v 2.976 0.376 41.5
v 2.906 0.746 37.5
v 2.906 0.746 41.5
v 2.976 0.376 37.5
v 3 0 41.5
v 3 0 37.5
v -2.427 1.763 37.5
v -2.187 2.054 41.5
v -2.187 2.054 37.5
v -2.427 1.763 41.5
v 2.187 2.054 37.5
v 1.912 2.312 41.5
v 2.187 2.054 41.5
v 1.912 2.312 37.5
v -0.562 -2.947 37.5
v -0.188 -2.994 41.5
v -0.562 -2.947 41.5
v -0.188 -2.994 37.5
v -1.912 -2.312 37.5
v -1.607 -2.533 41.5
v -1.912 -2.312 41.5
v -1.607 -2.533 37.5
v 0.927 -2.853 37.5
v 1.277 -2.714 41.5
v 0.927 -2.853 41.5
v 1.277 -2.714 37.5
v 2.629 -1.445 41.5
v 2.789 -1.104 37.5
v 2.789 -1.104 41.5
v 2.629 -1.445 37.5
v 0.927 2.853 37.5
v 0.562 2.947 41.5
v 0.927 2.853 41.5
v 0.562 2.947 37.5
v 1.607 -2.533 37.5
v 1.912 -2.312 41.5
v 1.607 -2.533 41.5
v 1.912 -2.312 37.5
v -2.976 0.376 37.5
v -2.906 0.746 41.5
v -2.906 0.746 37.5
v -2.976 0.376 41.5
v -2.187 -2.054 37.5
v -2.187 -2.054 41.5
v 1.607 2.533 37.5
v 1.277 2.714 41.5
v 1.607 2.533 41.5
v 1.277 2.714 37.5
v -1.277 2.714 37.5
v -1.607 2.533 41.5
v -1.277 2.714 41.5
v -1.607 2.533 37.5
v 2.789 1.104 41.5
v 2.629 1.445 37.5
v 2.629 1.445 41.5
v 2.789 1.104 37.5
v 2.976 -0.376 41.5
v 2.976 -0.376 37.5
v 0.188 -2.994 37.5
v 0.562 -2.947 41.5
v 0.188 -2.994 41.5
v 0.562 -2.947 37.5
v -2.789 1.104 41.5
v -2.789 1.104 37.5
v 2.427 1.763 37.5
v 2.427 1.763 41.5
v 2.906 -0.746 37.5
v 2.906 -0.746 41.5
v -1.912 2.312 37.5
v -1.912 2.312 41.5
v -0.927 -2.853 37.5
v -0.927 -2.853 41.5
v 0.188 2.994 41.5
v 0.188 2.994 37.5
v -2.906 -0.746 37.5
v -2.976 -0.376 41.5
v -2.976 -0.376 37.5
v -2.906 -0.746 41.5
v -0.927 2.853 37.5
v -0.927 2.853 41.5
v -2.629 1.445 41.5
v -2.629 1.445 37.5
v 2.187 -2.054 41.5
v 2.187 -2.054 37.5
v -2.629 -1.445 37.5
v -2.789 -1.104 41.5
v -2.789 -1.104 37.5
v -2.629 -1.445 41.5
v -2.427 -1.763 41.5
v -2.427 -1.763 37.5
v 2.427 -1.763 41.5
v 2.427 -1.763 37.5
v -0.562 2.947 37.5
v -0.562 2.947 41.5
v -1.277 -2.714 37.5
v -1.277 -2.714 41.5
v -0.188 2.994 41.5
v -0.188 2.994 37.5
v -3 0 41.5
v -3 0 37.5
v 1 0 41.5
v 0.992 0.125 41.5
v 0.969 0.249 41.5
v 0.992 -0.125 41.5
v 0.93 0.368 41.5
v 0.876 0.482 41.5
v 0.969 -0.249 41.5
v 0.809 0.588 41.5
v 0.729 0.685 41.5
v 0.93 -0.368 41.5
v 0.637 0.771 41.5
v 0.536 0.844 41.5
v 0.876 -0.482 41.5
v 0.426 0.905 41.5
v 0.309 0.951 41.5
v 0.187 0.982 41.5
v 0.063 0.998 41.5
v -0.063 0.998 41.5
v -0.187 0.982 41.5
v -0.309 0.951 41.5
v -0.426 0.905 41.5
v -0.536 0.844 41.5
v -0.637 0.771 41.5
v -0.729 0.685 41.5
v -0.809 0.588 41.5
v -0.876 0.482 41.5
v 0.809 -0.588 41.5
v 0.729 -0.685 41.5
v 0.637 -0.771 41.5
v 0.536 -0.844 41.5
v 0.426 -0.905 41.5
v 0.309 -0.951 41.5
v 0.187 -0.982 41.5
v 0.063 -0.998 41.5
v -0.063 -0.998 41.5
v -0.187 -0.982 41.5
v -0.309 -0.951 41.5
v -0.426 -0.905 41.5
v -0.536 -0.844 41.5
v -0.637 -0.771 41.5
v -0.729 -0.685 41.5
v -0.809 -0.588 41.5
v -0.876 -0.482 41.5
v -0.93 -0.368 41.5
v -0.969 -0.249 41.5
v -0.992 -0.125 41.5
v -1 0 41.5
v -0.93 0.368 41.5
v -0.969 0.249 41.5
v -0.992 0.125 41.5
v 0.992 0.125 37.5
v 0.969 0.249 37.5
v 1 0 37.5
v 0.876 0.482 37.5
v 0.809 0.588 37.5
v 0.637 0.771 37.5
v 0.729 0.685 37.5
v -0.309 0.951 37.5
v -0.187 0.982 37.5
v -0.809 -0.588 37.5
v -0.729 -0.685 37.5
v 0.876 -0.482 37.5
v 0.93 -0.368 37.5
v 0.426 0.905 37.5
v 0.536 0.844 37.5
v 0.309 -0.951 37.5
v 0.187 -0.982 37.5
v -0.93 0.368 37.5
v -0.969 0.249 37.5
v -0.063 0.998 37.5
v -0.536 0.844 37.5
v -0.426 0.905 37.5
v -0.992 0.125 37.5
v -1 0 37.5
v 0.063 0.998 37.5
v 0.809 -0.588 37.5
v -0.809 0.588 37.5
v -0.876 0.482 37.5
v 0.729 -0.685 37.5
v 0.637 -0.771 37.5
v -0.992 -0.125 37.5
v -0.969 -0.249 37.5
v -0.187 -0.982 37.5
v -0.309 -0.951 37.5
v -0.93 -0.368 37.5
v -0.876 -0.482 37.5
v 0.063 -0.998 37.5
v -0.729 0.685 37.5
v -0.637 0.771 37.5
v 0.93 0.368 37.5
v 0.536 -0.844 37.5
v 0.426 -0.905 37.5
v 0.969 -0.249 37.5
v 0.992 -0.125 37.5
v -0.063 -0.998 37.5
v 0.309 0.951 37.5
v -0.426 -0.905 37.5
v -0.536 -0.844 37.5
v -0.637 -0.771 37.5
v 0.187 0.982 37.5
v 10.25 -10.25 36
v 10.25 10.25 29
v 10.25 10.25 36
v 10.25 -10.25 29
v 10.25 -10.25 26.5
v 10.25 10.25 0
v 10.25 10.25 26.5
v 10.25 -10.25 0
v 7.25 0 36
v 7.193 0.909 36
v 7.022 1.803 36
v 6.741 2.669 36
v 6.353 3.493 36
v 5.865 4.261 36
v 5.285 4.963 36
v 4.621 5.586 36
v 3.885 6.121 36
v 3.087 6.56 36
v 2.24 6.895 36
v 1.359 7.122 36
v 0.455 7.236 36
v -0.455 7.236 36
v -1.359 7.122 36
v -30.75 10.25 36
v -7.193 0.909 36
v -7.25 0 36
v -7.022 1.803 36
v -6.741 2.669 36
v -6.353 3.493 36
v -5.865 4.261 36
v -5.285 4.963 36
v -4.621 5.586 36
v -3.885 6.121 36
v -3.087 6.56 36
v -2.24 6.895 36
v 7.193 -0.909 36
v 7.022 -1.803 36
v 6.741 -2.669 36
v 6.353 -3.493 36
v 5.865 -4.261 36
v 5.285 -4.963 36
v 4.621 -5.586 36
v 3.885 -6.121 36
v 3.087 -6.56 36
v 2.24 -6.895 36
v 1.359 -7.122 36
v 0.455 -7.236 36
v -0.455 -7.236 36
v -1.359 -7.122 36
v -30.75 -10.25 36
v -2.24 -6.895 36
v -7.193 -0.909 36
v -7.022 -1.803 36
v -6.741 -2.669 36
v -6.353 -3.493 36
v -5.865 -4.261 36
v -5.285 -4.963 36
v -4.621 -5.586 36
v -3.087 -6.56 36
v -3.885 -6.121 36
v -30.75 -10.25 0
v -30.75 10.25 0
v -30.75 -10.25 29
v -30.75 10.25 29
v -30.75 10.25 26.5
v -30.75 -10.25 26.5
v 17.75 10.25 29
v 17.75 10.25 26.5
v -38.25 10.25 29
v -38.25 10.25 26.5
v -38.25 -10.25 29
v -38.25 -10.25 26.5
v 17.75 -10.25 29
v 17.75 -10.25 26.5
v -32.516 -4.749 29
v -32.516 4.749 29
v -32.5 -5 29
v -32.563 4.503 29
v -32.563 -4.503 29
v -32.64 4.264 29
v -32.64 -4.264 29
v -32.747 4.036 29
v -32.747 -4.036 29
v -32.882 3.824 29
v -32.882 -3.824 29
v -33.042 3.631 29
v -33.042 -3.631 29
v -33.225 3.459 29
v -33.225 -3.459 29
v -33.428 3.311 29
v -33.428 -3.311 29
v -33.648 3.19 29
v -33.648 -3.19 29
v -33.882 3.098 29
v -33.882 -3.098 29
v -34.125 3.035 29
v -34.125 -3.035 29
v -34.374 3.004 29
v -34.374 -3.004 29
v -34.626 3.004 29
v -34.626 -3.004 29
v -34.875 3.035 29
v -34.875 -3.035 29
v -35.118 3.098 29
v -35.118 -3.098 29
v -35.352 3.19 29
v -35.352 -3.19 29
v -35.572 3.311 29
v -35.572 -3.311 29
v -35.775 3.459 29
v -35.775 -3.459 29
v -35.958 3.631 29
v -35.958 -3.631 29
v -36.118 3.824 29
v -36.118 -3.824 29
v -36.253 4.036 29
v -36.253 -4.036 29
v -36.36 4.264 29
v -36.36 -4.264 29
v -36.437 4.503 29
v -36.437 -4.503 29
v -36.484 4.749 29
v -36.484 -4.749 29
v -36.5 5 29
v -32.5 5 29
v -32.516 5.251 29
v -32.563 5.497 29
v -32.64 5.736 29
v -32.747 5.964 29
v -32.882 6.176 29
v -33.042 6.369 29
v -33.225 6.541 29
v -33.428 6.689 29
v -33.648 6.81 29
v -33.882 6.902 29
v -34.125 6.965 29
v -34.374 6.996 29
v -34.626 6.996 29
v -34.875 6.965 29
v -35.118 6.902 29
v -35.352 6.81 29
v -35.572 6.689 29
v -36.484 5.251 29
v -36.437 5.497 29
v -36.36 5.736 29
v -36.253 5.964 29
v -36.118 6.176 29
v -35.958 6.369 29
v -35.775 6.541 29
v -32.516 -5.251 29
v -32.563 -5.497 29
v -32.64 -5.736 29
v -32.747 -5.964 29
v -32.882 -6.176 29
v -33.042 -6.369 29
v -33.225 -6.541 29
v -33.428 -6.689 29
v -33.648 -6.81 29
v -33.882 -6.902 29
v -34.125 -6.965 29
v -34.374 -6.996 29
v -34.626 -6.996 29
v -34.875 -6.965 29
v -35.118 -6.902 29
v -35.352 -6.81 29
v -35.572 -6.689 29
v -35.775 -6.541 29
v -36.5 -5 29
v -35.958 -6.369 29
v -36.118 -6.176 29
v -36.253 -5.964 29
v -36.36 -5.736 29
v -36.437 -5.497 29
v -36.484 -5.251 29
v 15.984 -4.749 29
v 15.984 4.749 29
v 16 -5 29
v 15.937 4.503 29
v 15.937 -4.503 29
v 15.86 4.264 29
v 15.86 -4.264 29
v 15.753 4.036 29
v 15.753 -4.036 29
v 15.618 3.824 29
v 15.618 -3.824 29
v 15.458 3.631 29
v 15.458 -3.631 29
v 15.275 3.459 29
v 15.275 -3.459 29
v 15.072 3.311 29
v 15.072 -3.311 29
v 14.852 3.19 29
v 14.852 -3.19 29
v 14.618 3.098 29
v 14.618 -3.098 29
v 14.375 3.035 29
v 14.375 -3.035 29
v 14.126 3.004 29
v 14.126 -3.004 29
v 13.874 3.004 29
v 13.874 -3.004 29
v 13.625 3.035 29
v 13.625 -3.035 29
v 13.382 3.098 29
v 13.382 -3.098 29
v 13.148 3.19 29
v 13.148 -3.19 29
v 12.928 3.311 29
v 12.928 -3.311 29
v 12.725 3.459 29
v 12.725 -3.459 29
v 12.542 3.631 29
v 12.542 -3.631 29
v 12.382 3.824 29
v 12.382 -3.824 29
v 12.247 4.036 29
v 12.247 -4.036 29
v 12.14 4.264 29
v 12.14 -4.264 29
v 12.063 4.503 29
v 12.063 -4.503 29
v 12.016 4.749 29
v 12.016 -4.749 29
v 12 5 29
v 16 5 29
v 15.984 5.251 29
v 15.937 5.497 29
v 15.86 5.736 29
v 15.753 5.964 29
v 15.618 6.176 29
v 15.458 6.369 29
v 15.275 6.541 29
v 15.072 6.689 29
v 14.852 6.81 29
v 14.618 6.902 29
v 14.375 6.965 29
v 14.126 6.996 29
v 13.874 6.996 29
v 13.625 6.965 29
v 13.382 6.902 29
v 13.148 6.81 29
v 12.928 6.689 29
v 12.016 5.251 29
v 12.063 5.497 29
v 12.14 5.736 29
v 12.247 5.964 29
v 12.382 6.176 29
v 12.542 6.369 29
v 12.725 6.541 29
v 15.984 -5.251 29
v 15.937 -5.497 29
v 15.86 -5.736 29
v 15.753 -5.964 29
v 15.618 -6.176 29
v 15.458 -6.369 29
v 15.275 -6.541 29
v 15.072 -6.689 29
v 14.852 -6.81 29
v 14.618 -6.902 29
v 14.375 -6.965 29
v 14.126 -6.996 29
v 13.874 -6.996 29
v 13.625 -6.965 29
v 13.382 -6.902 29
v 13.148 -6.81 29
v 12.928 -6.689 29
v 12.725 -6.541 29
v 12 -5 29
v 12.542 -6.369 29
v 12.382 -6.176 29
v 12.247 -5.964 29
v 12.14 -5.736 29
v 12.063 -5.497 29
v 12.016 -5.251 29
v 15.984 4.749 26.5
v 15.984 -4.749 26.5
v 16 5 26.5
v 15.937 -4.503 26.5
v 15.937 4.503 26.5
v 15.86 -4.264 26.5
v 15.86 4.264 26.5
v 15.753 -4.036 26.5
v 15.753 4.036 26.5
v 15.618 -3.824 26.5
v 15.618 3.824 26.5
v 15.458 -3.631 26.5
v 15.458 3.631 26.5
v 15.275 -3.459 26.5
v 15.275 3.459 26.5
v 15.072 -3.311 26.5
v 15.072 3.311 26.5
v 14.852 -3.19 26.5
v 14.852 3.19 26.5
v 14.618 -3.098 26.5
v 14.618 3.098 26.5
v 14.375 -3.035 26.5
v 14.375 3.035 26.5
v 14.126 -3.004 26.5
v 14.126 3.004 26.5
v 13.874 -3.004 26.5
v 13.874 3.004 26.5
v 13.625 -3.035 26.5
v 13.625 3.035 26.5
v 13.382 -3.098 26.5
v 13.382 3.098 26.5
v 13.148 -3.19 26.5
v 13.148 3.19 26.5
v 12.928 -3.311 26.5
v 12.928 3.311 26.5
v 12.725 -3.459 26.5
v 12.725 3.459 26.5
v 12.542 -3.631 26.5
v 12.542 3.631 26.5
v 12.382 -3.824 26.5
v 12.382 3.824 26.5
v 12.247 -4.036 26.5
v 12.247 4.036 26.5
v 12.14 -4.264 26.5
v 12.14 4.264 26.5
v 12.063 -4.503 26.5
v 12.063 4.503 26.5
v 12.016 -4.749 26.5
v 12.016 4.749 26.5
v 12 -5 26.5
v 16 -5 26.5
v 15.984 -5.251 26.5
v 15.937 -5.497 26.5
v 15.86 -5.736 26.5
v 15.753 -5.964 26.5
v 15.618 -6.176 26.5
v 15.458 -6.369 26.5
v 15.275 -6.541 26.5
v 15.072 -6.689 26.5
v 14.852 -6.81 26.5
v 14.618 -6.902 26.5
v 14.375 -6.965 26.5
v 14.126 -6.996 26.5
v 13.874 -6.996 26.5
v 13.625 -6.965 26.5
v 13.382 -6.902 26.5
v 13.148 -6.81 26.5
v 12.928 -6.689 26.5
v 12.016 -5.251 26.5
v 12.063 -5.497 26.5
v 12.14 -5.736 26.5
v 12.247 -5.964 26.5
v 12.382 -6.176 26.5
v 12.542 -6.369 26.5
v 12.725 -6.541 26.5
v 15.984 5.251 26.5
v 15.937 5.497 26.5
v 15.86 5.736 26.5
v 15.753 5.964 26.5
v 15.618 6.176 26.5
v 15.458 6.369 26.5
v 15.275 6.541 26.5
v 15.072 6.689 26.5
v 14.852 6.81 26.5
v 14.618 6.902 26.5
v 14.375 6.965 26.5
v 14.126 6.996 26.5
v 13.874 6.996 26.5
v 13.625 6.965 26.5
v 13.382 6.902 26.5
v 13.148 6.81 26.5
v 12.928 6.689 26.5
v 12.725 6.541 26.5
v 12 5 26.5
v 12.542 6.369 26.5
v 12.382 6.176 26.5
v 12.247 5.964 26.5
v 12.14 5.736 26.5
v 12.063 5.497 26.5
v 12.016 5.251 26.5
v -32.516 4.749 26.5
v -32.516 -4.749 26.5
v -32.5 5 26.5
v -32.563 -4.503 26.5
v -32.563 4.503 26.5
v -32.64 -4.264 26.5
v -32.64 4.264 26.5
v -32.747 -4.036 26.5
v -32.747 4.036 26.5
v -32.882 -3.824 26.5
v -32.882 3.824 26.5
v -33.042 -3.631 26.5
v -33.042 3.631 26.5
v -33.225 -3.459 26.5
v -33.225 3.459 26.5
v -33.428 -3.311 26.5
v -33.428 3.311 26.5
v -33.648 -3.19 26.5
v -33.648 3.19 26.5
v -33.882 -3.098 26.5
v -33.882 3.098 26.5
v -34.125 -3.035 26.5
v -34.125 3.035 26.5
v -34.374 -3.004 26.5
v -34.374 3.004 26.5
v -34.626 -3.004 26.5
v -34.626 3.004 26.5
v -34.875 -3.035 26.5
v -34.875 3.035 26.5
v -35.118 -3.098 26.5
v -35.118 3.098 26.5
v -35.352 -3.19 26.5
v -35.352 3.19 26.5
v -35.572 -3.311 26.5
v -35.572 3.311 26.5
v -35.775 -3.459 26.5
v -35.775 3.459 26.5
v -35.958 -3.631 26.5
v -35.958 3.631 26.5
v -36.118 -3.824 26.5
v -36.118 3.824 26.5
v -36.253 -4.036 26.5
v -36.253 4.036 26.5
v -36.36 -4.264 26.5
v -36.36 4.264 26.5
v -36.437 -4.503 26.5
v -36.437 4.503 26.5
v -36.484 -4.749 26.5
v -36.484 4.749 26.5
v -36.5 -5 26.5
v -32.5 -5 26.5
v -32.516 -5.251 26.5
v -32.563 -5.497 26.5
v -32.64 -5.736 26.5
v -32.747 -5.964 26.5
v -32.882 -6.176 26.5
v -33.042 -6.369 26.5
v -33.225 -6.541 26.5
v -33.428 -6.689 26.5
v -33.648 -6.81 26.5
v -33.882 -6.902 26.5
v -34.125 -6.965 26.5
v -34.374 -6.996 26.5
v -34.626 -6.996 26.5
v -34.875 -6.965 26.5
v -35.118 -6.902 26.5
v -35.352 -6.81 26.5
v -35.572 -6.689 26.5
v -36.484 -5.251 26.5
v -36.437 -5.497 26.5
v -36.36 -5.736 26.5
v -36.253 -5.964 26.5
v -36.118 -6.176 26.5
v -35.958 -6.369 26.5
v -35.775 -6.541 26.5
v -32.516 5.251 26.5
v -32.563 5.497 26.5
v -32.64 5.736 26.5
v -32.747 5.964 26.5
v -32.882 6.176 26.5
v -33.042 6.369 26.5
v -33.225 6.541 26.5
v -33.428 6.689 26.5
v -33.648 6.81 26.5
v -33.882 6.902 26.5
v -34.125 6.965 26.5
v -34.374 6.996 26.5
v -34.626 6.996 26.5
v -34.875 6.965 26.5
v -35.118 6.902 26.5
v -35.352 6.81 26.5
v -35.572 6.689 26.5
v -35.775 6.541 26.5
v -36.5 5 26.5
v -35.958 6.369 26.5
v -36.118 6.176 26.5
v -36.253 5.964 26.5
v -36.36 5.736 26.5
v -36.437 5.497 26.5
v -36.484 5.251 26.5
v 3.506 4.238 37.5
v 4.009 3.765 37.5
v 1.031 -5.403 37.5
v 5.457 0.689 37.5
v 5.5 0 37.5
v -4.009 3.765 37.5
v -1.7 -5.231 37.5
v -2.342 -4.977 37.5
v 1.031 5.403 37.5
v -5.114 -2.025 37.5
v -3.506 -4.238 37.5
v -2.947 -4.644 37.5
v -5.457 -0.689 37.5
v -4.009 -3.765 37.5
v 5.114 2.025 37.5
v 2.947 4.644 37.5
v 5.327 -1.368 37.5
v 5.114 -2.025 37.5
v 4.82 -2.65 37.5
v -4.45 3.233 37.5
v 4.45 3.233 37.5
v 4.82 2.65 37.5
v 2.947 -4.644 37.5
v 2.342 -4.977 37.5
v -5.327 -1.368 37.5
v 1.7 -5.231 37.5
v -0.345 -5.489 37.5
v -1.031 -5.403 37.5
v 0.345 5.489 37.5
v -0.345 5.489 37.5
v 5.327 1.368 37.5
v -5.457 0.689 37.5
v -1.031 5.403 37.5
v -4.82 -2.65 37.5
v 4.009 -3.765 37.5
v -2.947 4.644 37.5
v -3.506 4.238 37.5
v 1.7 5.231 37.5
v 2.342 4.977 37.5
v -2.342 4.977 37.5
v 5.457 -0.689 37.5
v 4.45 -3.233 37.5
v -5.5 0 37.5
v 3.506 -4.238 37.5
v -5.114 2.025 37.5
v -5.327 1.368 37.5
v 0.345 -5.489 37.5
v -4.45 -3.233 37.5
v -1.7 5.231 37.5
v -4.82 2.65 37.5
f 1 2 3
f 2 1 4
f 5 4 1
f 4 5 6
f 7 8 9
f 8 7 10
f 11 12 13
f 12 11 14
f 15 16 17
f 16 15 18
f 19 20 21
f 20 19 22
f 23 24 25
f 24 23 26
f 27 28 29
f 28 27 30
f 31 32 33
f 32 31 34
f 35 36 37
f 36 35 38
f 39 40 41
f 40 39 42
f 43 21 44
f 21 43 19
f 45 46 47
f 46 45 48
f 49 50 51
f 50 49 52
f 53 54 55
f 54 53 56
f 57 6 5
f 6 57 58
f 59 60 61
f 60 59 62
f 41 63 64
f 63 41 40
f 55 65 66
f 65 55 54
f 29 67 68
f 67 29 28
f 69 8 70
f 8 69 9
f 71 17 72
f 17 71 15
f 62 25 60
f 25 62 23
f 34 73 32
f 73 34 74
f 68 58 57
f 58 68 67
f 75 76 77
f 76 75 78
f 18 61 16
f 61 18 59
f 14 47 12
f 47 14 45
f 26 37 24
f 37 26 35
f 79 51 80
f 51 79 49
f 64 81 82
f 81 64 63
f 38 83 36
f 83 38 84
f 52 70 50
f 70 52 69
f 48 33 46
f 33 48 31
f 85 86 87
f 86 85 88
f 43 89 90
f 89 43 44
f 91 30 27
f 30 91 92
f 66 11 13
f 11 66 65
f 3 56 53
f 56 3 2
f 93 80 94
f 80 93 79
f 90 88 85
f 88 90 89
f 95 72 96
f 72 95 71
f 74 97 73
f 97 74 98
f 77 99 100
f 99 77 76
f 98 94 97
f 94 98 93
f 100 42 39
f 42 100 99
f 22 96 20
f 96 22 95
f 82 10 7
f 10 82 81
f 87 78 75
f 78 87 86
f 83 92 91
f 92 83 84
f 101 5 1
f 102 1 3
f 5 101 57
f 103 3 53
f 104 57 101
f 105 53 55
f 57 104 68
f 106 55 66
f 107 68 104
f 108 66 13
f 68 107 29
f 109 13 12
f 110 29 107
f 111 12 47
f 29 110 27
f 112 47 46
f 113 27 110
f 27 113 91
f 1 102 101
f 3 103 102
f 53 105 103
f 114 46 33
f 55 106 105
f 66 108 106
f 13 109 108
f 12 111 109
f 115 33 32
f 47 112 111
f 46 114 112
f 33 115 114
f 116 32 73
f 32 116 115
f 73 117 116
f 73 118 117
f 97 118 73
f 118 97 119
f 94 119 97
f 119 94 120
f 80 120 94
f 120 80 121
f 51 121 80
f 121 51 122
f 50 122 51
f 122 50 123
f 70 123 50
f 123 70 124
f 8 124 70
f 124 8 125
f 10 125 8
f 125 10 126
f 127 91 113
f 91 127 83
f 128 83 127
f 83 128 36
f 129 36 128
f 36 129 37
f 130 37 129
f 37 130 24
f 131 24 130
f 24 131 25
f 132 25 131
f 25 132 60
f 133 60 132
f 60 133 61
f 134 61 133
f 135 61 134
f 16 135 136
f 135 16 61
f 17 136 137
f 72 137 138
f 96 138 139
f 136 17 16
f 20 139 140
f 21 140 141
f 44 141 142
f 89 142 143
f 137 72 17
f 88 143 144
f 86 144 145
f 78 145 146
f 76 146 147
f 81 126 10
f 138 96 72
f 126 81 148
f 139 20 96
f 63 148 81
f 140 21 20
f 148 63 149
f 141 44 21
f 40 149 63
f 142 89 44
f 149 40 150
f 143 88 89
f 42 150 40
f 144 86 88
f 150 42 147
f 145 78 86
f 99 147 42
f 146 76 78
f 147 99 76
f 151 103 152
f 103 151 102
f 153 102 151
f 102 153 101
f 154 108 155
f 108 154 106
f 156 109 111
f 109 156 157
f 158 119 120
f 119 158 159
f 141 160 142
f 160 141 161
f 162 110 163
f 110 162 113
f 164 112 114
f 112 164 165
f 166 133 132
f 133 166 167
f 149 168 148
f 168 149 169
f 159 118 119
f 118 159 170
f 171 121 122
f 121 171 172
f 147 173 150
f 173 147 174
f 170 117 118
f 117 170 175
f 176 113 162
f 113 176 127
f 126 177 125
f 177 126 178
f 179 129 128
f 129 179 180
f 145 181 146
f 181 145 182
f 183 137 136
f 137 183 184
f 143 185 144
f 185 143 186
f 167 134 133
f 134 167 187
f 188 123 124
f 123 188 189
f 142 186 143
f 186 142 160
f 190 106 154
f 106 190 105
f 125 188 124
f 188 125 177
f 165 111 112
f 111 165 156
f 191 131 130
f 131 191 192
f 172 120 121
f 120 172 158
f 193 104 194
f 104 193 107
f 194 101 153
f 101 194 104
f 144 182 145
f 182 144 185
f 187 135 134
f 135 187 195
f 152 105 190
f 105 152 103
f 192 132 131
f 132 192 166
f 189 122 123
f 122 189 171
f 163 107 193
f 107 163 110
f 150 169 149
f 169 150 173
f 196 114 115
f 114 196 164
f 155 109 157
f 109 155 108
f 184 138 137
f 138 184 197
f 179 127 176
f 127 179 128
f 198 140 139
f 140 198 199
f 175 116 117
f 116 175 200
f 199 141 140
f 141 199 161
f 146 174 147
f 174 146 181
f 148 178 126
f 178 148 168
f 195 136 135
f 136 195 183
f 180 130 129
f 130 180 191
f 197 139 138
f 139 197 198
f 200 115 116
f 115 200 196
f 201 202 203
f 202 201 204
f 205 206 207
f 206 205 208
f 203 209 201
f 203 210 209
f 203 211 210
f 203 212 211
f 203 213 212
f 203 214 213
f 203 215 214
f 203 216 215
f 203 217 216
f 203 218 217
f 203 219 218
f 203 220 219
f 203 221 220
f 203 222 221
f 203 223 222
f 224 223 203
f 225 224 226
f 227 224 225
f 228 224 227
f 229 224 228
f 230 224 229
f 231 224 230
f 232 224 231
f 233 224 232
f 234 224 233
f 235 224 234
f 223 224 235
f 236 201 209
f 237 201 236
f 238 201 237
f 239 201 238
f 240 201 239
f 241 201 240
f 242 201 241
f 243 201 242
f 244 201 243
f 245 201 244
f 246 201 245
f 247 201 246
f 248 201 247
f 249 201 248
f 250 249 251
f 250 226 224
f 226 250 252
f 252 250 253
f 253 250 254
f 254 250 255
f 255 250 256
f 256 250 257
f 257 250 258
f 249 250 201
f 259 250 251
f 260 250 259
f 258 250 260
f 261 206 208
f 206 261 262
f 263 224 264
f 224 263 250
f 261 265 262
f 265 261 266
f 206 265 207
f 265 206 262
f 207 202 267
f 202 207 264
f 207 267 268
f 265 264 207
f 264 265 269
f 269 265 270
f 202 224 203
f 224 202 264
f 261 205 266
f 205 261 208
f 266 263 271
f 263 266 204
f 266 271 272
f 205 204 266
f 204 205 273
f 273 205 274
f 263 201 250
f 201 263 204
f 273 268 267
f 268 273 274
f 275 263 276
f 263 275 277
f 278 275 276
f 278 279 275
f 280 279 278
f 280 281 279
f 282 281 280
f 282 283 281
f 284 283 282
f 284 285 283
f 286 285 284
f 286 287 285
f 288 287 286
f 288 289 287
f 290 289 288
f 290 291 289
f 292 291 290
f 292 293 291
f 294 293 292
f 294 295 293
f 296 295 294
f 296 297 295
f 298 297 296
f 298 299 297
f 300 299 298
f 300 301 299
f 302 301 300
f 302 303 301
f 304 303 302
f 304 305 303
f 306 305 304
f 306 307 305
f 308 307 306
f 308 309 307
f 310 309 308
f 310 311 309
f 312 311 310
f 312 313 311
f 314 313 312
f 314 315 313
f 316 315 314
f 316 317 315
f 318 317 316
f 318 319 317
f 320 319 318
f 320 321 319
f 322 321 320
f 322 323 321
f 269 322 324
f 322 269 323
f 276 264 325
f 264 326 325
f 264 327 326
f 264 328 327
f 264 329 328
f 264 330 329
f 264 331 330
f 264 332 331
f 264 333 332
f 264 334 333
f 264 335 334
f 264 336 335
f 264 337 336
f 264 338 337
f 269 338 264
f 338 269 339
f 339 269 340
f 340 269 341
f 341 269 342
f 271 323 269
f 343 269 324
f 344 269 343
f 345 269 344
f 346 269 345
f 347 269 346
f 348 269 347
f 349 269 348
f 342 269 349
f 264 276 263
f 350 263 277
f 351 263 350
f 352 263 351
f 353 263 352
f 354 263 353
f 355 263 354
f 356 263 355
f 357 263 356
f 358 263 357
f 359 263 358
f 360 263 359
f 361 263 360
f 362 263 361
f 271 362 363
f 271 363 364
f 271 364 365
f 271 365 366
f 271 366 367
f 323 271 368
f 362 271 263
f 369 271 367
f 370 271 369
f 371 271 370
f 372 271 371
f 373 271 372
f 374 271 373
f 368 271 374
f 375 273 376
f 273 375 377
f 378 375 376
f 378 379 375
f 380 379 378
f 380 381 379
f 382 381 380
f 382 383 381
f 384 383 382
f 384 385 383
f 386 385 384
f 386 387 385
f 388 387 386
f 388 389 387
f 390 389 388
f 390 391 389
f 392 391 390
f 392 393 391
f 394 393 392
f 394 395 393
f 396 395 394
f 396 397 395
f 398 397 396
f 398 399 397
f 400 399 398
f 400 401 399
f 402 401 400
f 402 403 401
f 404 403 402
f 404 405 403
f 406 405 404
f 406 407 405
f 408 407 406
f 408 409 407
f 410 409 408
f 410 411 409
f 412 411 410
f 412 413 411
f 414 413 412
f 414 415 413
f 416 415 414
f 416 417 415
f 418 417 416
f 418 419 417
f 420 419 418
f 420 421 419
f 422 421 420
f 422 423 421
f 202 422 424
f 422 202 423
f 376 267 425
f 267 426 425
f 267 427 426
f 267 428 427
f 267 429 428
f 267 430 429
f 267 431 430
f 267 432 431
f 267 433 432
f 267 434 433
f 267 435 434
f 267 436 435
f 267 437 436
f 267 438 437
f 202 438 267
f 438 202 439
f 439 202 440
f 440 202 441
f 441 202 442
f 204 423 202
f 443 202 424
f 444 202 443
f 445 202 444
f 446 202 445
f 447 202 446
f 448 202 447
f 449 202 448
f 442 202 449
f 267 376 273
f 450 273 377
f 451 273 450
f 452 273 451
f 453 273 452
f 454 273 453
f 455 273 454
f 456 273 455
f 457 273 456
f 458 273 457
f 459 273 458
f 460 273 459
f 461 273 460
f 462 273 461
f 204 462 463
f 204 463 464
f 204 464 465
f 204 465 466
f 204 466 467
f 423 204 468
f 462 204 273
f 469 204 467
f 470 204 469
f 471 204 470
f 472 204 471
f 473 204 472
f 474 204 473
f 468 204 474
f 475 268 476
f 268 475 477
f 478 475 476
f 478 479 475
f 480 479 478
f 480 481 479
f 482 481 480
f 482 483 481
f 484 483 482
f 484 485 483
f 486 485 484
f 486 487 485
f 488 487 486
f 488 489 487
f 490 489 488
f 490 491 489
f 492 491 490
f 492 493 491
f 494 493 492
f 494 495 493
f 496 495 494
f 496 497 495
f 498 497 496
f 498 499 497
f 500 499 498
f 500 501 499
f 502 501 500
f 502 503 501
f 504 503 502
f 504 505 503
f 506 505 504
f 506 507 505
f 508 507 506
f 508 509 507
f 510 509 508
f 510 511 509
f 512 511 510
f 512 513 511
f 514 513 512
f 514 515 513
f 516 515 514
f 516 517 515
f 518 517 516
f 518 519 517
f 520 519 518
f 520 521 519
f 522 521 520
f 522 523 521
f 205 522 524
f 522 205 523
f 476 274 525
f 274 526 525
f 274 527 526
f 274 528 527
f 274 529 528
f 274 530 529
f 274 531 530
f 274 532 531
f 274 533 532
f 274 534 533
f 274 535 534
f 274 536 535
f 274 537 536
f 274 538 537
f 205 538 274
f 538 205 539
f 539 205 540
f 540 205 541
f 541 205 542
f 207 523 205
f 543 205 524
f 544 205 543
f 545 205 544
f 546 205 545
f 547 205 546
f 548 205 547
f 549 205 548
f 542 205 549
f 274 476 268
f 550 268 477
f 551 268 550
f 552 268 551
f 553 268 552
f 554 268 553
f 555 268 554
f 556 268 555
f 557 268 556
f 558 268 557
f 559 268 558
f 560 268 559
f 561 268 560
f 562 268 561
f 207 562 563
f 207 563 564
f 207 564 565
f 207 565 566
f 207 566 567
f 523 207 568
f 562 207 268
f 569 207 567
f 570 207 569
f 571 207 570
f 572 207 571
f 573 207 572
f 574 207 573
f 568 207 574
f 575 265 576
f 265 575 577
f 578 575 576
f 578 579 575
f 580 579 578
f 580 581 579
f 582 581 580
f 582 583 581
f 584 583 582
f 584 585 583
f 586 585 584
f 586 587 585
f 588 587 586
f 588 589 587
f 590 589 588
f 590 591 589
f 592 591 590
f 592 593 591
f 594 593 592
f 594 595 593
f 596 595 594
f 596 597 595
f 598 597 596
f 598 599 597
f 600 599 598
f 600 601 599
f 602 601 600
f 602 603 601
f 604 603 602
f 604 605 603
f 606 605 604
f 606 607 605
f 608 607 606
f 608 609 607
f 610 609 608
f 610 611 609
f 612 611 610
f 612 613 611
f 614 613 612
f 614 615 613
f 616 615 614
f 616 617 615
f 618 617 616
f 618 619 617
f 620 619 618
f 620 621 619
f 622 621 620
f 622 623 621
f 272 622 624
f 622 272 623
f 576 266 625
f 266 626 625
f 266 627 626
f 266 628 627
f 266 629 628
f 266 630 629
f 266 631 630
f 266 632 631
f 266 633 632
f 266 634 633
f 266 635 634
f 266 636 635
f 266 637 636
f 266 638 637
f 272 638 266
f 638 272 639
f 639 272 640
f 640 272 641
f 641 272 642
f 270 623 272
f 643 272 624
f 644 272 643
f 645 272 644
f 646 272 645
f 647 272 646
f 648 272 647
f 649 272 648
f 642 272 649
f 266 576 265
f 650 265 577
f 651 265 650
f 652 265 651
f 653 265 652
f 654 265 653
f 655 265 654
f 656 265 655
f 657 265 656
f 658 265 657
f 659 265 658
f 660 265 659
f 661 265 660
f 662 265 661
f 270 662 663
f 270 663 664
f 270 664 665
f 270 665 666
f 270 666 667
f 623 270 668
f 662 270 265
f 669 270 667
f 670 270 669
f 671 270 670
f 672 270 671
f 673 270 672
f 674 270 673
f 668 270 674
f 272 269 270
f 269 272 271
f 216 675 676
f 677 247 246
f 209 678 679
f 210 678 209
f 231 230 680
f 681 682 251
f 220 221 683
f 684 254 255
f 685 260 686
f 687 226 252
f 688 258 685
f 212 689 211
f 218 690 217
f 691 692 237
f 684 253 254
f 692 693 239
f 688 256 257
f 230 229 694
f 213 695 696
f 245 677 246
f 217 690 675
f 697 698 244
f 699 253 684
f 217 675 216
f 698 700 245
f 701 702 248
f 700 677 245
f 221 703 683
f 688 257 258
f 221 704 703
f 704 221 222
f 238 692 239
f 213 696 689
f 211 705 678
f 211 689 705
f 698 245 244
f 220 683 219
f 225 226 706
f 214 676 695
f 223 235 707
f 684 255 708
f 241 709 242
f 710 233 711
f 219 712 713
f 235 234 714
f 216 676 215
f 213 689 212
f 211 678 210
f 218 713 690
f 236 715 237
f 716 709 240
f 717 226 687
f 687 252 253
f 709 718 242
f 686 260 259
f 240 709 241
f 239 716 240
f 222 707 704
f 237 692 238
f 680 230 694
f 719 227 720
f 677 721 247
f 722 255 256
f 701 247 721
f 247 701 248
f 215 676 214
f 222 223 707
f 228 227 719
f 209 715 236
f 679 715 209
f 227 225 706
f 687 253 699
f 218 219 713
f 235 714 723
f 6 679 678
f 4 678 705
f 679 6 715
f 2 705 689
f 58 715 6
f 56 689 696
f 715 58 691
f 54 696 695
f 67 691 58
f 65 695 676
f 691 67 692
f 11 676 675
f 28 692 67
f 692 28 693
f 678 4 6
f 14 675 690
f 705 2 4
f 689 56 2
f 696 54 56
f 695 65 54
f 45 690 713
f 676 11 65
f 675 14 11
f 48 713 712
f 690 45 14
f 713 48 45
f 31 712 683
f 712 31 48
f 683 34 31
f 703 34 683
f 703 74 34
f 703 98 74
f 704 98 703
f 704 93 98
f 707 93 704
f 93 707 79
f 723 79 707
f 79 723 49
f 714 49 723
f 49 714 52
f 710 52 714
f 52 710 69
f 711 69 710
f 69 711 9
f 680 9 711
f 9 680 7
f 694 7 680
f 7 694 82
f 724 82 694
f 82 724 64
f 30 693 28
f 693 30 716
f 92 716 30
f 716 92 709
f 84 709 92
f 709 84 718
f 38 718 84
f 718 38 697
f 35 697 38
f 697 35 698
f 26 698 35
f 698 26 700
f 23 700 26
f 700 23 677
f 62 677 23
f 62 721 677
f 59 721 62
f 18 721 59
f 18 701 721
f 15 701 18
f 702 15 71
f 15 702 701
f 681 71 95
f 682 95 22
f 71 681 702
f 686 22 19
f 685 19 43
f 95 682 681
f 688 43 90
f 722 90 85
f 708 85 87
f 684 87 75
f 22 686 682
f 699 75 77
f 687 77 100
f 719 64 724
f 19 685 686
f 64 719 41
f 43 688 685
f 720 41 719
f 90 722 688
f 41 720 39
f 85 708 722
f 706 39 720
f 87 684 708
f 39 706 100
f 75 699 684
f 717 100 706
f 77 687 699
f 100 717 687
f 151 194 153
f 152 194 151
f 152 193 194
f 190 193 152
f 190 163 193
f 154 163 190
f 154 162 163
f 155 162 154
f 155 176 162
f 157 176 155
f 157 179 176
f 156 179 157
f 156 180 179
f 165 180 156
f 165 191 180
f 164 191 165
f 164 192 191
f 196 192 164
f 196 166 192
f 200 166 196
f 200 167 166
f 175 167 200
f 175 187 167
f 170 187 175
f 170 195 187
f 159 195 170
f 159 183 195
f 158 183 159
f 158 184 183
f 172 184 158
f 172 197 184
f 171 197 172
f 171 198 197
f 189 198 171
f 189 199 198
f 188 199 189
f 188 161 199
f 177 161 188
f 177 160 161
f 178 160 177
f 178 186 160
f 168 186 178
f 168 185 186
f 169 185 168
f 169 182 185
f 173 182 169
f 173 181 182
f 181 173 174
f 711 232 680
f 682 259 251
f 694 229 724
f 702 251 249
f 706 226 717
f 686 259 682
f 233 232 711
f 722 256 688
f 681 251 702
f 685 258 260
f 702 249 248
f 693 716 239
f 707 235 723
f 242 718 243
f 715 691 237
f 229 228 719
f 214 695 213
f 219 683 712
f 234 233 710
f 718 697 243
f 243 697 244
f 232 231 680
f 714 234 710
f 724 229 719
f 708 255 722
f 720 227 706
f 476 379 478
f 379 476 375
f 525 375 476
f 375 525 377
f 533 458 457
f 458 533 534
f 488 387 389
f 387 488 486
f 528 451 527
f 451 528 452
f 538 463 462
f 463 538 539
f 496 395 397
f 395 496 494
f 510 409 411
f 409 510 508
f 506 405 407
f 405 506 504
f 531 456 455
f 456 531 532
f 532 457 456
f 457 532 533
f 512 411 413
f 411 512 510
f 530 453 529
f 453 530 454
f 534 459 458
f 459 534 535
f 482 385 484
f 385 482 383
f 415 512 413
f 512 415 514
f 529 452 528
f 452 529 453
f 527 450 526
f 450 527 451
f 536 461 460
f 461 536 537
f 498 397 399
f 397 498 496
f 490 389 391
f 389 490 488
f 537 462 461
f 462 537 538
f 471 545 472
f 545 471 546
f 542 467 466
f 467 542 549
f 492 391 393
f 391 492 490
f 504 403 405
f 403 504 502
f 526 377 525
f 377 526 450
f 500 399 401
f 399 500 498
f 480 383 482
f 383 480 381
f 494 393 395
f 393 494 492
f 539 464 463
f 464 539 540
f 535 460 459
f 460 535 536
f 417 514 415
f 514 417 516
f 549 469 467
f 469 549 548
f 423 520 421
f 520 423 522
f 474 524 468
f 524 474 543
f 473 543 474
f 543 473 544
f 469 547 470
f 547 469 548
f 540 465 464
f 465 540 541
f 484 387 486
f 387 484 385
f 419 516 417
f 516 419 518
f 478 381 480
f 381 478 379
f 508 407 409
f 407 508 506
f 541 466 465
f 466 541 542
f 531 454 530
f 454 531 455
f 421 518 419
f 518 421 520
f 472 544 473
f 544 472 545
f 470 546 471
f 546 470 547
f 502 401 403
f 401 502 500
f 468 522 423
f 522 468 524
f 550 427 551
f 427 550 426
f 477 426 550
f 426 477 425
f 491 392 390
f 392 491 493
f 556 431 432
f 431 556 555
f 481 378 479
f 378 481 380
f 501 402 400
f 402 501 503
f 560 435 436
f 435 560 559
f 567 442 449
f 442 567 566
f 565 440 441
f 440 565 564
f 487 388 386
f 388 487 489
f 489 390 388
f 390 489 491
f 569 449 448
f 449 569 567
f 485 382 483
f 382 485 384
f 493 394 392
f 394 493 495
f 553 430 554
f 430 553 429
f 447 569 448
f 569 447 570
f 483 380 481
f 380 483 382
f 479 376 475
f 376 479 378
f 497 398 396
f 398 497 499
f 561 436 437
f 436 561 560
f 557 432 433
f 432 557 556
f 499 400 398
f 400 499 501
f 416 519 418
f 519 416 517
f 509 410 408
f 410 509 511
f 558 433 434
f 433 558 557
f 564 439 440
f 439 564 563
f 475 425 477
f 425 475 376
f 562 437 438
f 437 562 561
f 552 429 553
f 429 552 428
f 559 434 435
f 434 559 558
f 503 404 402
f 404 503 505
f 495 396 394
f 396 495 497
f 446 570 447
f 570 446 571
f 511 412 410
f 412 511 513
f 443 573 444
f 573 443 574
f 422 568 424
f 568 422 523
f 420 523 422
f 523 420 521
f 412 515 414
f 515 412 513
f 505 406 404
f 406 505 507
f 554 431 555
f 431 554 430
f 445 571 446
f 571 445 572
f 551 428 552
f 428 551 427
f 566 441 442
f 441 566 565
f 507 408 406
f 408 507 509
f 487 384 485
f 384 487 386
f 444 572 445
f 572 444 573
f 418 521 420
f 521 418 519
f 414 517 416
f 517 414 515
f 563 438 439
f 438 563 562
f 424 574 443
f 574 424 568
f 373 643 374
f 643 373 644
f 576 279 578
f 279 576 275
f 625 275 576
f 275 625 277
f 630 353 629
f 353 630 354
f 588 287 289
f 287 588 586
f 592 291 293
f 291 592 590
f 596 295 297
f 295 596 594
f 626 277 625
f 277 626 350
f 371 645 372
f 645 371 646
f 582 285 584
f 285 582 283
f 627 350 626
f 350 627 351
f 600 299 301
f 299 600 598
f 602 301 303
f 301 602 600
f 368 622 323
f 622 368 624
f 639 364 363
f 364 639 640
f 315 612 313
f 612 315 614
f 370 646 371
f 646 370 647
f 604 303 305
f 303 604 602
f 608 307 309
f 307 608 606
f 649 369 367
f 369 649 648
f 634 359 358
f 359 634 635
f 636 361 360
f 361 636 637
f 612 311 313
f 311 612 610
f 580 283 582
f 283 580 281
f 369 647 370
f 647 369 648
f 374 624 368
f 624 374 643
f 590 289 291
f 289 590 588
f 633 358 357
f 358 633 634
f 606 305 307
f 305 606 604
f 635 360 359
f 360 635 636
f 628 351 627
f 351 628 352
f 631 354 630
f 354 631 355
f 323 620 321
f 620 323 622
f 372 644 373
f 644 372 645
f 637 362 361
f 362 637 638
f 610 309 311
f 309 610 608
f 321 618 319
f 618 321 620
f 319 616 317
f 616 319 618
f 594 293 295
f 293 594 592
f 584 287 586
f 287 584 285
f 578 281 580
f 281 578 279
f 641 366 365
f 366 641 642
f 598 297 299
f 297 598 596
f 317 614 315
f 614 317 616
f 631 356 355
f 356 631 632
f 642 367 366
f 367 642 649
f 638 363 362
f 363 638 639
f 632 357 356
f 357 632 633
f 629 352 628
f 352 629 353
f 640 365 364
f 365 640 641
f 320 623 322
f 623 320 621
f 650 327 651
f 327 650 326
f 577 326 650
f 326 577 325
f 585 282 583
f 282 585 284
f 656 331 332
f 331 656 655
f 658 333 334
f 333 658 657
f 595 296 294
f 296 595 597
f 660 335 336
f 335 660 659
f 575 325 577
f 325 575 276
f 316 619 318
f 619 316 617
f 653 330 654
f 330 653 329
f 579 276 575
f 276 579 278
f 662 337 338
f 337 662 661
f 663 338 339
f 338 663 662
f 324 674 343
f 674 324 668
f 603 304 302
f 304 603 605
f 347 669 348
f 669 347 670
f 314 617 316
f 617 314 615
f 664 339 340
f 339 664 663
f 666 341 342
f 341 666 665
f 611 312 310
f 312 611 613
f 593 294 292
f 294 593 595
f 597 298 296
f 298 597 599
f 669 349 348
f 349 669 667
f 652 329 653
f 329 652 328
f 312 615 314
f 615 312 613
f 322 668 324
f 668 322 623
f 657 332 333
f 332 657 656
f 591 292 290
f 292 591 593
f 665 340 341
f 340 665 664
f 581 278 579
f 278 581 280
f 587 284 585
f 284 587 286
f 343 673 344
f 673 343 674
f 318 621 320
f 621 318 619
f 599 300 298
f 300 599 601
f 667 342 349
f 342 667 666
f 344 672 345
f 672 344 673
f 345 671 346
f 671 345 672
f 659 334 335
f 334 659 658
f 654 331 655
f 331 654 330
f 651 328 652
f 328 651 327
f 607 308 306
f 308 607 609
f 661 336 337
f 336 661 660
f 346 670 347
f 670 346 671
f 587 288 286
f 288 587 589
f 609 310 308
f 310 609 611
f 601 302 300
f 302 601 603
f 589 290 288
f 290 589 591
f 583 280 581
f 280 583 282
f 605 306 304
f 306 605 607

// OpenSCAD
infinity=1000;

module Servo(L=41, W=20.5, H=36, CutoutL=0, CutoutH=0, FlangeL=7.5, FlangeH=2.5, FlangeFromTop=7,
	HolesN=2, HoleD=4, HolesXDist=48.5, HolesYDist=10, AxisD=6, AxisH=5.5, AxisHoleD=2,
	AxisFlangeD1=14.5, AxisFlangeD2=11, AxisFlangeH=1.5)
{
	x0=L-W/2;
	difference()
	{
		union()
		{
			// body
			translate([-x0, -W/2, 0])
				cube([L,W,H]);
			// mounting flanges
			translate([-x0-FlangeL, -W/2, H-FlangeH-FlangeFromTop])
				cube([L+2*FlangeL, W, FlangeH]);
			// axis flange
			translate([0, 0, H])
				cylinder(r1=AxisFlangeD1/2, r2=AxisFlangeD2/2, h=AxisFlangeH);
			// axis
			translate([0, 0, H])
				difference()
				{
					cylinder(r=AxisD/2, h=AxisH);
					cylinder(r=AxisHoleD/2, h=infinity, center=true);
				}
		}
		// top cut-out 
		translate([-infinity+CutoutL-x0, -infinity/2, H-CutoutH])
			cube([infinity, infinity, infinity]);
		// flange holes
		for(x=[1,-1])
			for(y=[1:HolesN])
				translate([-x0+L/2+HolesXDist/2*x,(HolesN-1)*HolesYDist*(y-1.5),0])
					cylinder(r=HoleD/2, h=infinity);
	}
}

$fn=50;
Servo();
